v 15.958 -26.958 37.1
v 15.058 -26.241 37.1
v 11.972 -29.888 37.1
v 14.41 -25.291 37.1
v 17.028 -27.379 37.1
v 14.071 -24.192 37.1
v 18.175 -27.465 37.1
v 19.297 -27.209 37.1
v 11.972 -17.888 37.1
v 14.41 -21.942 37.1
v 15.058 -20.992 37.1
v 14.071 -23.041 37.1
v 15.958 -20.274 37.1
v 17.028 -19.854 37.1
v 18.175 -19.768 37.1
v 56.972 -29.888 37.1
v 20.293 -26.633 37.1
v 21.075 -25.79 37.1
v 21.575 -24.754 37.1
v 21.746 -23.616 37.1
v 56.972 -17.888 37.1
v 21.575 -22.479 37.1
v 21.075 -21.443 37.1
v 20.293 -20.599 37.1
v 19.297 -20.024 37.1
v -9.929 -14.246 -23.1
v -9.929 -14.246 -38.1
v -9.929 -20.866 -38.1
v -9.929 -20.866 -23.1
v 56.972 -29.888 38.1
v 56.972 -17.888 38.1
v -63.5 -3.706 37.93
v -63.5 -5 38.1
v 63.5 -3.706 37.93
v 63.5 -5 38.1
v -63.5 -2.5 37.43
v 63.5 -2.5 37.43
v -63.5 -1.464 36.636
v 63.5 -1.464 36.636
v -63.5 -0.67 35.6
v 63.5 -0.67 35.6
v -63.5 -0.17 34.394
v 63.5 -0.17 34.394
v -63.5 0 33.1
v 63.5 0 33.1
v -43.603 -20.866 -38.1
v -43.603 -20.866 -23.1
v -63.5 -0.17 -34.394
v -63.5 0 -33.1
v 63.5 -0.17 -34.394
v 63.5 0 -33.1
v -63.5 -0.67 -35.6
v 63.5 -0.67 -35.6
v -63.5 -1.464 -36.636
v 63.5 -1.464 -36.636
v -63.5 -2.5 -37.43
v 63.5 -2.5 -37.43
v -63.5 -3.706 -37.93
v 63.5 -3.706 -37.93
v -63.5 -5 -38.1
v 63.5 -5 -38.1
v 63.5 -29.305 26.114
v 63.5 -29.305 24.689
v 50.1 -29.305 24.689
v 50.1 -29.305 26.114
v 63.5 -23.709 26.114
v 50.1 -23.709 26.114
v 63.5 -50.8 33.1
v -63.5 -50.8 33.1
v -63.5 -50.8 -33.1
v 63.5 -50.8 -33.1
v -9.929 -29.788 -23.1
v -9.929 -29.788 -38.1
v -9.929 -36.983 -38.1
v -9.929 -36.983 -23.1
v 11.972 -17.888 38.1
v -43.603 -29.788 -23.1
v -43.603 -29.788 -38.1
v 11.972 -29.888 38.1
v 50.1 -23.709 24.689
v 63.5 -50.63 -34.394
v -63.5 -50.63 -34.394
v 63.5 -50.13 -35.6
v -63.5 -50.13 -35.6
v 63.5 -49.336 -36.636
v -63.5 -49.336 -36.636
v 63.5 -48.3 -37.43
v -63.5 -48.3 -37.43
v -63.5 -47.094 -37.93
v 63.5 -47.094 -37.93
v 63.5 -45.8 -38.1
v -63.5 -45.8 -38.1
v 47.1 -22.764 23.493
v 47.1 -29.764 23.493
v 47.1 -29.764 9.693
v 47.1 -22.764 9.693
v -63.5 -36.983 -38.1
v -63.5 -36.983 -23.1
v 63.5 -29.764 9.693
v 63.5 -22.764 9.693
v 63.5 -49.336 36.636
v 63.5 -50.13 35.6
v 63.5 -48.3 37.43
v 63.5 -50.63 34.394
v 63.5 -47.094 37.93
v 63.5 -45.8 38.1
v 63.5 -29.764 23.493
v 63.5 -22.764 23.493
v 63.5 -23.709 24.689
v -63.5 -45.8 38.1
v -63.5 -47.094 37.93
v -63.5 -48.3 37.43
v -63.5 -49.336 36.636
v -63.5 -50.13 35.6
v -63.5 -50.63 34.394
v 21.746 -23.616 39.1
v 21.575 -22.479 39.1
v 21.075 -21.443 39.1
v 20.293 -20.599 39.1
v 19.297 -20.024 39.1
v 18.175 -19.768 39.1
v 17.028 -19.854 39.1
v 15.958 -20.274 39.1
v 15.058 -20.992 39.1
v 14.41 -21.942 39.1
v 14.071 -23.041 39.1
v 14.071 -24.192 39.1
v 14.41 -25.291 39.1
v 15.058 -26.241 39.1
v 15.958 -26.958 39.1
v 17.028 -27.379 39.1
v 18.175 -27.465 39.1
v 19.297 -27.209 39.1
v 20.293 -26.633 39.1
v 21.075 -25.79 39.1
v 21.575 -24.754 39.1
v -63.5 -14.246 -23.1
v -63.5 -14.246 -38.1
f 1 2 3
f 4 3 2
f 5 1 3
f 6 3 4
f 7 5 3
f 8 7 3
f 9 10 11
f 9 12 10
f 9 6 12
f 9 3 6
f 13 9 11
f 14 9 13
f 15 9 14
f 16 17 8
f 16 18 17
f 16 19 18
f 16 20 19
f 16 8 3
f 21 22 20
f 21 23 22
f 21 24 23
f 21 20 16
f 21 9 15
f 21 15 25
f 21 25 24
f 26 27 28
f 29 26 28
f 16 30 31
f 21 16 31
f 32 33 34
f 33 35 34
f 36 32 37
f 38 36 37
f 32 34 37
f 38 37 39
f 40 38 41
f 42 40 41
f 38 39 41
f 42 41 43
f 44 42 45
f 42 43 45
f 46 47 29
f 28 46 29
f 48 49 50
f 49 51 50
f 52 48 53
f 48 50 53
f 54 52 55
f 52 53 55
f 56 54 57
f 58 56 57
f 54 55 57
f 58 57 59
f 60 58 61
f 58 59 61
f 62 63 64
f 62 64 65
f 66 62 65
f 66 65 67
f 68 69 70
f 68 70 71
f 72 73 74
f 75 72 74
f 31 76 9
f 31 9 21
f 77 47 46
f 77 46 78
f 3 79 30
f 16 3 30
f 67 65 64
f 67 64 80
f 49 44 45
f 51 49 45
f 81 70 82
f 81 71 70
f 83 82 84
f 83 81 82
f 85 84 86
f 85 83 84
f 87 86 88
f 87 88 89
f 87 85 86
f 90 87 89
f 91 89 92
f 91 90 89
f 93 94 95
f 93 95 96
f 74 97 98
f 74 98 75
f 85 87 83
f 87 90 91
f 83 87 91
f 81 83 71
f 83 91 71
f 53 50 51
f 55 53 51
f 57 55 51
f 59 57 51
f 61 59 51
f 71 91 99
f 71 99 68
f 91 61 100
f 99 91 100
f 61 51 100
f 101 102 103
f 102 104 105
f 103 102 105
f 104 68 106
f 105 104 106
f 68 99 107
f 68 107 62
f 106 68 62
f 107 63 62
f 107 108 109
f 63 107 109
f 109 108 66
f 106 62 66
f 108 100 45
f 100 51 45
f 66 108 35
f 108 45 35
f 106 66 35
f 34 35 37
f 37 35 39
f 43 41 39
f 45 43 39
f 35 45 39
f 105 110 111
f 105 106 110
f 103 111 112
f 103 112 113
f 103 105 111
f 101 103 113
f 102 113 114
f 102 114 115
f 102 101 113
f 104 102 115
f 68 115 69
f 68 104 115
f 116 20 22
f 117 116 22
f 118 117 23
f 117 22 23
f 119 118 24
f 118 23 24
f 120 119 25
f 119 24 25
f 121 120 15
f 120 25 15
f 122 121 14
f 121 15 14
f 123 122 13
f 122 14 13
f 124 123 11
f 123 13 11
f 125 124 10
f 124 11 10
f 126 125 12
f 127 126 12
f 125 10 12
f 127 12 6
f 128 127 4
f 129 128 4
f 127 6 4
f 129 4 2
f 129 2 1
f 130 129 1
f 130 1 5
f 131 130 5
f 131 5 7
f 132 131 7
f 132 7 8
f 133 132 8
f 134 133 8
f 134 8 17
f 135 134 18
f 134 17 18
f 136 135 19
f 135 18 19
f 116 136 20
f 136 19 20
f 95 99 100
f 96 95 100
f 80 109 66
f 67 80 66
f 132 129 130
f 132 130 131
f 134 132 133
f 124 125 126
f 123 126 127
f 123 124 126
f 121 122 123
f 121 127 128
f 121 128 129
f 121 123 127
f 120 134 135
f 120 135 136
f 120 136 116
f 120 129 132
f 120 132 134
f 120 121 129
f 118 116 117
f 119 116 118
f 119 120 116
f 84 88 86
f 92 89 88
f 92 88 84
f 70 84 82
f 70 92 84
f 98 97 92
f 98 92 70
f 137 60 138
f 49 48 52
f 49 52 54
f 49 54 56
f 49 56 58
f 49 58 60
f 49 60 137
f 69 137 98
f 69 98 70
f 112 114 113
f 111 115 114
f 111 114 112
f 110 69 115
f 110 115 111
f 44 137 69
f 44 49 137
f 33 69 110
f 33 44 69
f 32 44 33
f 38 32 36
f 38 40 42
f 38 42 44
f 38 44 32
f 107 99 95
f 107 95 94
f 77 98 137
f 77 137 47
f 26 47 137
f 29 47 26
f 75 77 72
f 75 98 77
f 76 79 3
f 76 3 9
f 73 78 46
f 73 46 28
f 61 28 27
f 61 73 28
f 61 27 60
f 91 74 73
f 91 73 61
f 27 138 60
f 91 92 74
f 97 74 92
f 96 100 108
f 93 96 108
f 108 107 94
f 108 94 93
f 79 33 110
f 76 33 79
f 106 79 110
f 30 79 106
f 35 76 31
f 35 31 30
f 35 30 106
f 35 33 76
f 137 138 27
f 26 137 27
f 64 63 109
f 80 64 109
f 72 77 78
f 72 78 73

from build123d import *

# Parameters (mm, degrees)
F0_W      = 127
F0_H      = 76.2
F1_DEPTH  = 50.8
F2_R      = 5
F3_R      = 5
F4_R      = 5
F5_W      = 7
F5_H      = 13.8
F6_DEPTH  = 16.4
F7_W      = 5.596507
F7_H      = 1.424566
F8_DEPTH  = 13.4
F9_W      = 45
F9_H      = 12
F10_DEPTH = 1
F11_R     = 3.85898
F12_DEPTH = 2
F13_W     = 53.570701
F13_H     = 22.736654
F14_DEPTH = 15
F15_W     = 33.673272
F15_H     = 8.921977
F16_DEPTH = 15


with BuildPart() as f1:
    # F0 (on Front) → F1 (new body)
    with BuildSketch(Plane.XZ):
        Rectangle(F0_W, F0_H)
    extrude(amount=F1_DEPTH)

    # F2
    f2_edges = [f1.edges().sort_by_distance(p)[0] for p in [
        (0, -50.8, 38.1),
    ]]
    fillet(f2_edges, radius=F2_R)

    # F3
    f3_edges = [f1.edges().sort_by_distance(p)[0] for p in [
        (0, 0, 38.1),
    ]]
    fillet(f3_edges, radius=F3_R)

    # F4
    f4_edges = [f1.edges().sort_by_distance(p)[0] for p in [
        (0, -50.8, -38.1),
        (0, 0, -38.1),
    ]]
    fillet(f4_edges, radius=F4_R)

    # F5 (on face) → F6 (cut)
    with BuildSketch(Plane.YZ.offset(63.5)):
        with Locations((-26.263526, 16.592734)):
            Rectangle(F5_W, F5_H)
    extrude(amount=-F6_DEPTH, mode=Mode.SUBTRACT)

    # F7 (on face) → F8 (cut)
    with BuildSketch(Plane.YZ.offset(63.5)):
        with Locations((-26.507245, 25.401587)):
            Rectangle(F7_W, F7_H)
    extrude(amount=-F8_DEPTH, mode=Mode.SUBTRACT)

    # F9 (on face) → F10 (cut)
    with BuildSketch(Plane.XY.offset(38.1)):
        with Locations((34.471648, -23.887878)):
            Rectangle(F9_W, F9_H)
    extrude(amount=-F10_DEPTH, mode=Mode.SUBTRACT)

    # F11 (on face) → F12 (join)
    with BuildSketch(Plane.XY.offset(37.1)):
        with Locations((17.887004, -23.616357)):
            Circle(F11_R)
    extrude(amount=F12_DEPTH)

    # F13 (on face) → F14 (cut)
    with BuildSketch(Plane(origin=(0, 0, -38.1), x_dir=(1, 0, 0), z_dir=(0, 0, -1))):
        with Locations((-36.71465, 25.614712)):
            Rectangle(F13_W, F13_H)
    extrude(amount=-F14_DEPTH, mode=Mode.SUBTRACT)

    # F15 (on face) → F16 (join)
    with BuildSketch(Plane(origin=(0, 0, -23.1), x_dir=(1, 0, 0), z_dir=(0, 0, -1))):
        with Locations((-26.765935, 25.326905)):
            Rectangle(F15_W, F15_H)
    extrude(amount=F16_DEPTH)


solid = f1.part
